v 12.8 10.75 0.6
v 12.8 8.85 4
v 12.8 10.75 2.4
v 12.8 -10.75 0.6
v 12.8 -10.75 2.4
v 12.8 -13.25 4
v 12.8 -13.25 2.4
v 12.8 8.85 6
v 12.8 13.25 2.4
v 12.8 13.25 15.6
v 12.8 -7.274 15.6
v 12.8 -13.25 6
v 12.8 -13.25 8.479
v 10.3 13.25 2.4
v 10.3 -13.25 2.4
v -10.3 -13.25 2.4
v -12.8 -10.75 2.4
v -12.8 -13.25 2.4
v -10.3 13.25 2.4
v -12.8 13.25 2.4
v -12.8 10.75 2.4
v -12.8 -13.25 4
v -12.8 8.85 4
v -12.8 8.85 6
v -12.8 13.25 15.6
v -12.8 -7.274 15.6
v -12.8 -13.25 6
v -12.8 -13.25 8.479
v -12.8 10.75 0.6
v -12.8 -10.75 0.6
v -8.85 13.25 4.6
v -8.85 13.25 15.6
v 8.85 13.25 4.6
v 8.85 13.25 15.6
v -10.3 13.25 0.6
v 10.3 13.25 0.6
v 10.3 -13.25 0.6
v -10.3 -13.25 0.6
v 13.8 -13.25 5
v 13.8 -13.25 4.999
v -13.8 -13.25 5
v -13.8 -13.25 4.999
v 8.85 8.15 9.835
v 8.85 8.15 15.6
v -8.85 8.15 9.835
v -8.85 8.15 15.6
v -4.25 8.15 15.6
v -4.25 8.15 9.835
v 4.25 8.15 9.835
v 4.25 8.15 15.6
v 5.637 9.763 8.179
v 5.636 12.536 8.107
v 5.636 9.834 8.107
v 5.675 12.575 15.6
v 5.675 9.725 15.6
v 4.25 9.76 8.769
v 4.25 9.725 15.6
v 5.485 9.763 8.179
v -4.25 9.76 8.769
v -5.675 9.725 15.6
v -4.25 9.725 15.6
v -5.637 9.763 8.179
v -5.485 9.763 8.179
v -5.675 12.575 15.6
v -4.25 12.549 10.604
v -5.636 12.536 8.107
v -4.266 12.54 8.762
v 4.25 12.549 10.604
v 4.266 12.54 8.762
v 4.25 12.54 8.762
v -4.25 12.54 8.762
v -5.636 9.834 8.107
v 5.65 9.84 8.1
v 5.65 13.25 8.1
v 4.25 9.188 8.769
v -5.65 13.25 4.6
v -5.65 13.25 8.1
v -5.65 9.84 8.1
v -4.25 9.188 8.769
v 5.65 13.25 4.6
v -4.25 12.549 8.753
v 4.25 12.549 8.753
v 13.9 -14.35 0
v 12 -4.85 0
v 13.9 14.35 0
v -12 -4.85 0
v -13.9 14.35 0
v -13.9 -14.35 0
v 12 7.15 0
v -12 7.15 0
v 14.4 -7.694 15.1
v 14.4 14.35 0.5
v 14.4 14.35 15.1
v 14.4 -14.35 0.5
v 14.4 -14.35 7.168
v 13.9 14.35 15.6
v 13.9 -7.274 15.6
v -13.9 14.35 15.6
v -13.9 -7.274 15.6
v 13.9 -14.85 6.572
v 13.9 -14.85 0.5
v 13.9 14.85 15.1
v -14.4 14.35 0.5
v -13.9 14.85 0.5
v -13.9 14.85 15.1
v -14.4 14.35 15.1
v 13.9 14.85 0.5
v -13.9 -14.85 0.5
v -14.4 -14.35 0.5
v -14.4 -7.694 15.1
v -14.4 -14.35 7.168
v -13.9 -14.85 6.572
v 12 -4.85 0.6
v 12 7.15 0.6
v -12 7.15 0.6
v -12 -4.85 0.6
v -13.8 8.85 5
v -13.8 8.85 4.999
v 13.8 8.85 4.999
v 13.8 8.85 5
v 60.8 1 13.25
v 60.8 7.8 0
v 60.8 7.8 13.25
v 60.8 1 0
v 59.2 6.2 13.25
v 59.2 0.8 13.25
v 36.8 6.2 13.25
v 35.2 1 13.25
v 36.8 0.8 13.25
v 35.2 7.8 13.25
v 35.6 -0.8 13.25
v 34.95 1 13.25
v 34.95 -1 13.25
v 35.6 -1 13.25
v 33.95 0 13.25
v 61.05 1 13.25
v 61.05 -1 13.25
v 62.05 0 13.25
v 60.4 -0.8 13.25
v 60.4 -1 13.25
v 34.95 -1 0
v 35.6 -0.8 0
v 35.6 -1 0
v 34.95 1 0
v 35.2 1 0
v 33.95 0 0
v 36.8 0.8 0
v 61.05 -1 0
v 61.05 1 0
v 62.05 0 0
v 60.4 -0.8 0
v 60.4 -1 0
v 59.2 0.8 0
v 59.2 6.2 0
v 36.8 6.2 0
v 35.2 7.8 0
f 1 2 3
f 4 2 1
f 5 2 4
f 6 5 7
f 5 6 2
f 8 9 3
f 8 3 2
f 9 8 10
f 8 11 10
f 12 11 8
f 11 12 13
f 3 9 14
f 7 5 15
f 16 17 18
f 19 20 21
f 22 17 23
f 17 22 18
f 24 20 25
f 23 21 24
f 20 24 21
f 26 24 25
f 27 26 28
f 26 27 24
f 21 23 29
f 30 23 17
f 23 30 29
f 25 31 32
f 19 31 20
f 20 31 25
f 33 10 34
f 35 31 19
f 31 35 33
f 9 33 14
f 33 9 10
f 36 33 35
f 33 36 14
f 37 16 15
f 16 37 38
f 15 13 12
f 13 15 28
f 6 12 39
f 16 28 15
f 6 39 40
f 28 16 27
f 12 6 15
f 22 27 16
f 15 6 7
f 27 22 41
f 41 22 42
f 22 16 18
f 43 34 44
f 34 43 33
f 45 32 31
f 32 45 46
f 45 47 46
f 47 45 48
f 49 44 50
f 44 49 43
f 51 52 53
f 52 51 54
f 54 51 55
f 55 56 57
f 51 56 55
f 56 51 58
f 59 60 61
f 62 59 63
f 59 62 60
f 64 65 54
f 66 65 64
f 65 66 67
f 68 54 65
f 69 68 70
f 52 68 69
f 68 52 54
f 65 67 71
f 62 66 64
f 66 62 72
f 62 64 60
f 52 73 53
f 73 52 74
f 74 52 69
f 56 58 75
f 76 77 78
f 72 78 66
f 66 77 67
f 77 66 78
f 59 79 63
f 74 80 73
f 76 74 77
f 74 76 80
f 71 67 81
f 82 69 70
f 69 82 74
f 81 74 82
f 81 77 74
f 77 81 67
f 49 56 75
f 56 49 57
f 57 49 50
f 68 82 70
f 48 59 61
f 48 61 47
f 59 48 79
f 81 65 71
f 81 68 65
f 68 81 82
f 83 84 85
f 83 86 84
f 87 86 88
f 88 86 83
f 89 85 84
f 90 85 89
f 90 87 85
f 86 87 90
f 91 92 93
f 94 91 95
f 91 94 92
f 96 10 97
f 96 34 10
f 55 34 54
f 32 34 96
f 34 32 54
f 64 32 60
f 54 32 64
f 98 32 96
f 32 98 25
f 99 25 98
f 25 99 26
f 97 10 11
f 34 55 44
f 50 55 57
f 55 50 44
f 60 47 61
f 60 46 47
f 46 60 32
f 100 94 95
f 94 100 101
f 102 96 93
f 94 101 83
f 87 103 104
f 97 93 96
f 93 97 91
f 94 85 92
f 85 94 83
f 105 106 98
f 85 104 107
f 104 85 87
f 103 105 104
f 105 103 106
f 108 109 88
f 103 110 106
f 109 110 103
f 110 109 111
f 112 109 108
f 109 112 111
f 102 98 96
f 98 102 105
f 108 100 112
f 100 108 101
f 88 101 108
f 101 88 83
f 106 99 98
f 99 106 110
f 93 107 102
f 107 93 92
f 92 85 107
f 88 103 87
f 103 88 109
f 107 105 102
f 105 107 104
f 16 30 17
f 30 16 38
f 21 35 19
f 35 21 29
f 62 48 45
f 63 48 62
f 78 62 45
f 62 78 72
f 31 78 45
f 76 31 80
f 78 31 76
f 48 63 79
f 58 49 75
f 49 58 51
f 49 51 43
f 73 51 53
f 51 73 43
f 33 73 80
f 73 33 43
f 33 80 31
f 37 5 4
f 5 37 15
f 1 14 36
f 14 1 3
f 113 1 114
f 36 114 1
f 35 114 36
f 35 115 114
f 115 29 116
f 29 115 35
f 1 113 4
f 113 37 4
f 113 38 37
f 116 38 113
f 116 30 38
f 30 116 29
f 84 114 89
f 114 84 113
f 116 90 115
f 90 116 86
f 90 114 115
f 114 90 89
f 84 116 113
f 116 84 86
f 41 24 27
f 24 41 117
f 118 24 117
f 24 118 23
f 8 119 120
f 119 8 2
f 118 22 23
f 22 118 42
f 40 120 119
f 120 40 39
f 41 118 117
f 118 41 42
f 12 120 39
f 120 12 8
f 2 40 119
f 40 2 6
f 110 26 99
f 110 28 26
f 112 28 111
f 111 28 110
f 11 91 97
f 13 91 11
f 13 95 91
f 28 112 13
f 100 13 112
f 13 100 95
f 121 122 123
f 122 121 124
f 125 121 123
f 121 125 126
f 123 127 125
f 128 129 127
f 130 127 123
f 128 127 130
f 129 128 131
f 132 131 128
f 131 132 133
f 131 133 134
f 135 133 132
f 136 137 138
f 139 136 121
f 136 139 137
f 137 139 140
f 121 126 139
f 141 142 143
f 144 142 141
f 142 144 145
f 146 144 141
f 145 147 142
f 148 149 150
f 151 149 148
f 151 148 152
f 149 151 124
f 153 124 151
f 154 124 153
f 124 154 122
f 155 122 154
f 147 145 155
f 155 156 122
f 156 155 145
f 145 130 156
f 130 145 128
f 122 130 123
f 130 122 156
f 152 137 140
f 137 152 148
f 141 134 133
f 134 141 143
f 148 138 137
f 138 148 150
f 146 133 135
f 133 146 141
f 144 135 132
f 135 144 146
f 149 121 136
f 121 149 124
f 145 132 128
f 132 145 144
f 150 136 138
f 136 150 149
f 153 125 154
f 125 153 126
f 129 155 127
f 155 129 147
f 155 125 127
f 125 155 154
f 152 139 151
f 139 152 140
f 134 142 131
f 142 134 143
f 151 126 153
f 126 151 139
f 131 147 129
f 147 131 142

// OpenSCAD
// SSD1306 oled module cover
// design by Marius Gheorghescu, September 2020

// offset between the OLED PCB and CurrentRanger PCB
pcb2pcb_offset = 12.60;

// pcb width&height + some clearance
oled_pcb_x = 25.3 + 0.3;
oled_pcb_y = 26.1 + 0.4;

// assuming square pattern
oled_screw_spacing = 21;

// screen dimensions
oled_screen_x = 24;
oled_screen_y = 12;
oled_screen_thickness = 2.4;

// oled offset from center (should be closer to the pins)
oled_screen_y_offset = 1.15;


oled_pcb_thickness = 1.6;

// connector + some clearance
connector_x = 11.3;
connector_y = 2.8;

// ideally multiple of extrusion width to minimize thin walls
wall_thickness = 1.6;
top_wall_thickness = 0.6;

// leave opening to see the logo / access serial 
open_bottom = 1;


// internal and computed values (LCD module + 2-3 layers of print)
epsilon = 0.001;
total_case_height = pcb2pcb_offset + oled_screen_thickness + top_wall_thickness;
retainer_clip_cutout = connector_y + wall_thickness;


module case()
{    
    difference() {

        translate([0, 0, total_case_height/2])
        hull() {
            cube([2*wall_thickness + oled_pcb_x-1, 2*wall_thickness + oled_pcb_y-1, total_case_height], center=true);
            cube([2*wall_thickness + oled_pcb_x, 2*wall_thickness + oled_pcb_y-1, total_case_height-1], center=true);    
            cube([2*wall_thickness + oled_pcb_x-1, 2*wall_thickness + oled_pcb_y, total_case_height-1], center=true);    
        }

        // PCB corner supports (look ma, no screws!)
        translate([0,0, (oled_screen_thickness + oled_pcb_thickness)/2 + top_wall_thickness])
            hull() {
                cube([oled_pcb_x-5, oled_pcb_y, oled_screen_thickness + oled_pcb_thickness], center=true);
                cube([oled_pcb_x, oled_pcb_y-5, oled_screen_thickness + oled_pcb_thickness], center=true);
                translate([0, 0, total_case_height])
                    cube([oled_pcb_x, epsilon, epsilon], center=true);
            }

        // pcb load path
        translate([0,0, total_case_height/2 + oled_screen_thickness])
        {
            difference() {
                
                union() {
                    cube([oled_pcb_x, oled_pcb_y, total_case_height], center=true);                
                }
                
                translate([0, oled_pcb_y/2 - connector_y*0.75, 0])
                    cube([connector_x + 4*wall_thickness, connector_y + + 2*wall_thickness, total_case_height], center=true);                
            }
        }

        // LCD cutout
        translate([0, oled_screen_y_offset, 0])
            cube([oled_screen_x, oled_screen_y, total_case_height], center=true);
        
        // connector    
        taper_amount = 0.08;
        translate([0, oled_pcb_y/2 - connector_y*0.75, total_case_height*3/2 - pcb2pcb_offset])
        {
            hull() {
                translate([0, 0, total_case_height/2])
                    cube([connector_x + taper_amount, connector_y + taper_amount, epsilon], center=true);
                translate([0, 0, -total_case_height/2])
                    cube([connector_x - taper_amount, connector_y - taper_amount, epsilon], center=true);
            }
            

            // connector load clearance
            hull() {
                translate([0, connector_y/8, -total_case_height/3])
                    cube([connector_x, connector_y*1.25, 5], center=true);

                translate([0, -connector_y, 0])
                    cube([epsilon, 4+epsilon, epsilon], center=true);
            }
           
            translate([0,-wall_thickness/2 - epsilon, 0])
                cube([connector_x - connector_y, connector_y+wall_thickness, total_case_height], center=true);
        }
        
    
            
        // retaining clip
        translate([0, -retainer_clip_cutout/2, oled_screen_thickness + oled_pcb_thickness + 1])
        hull() {
            cube([oled_pcb_x + 2, oled_pcb_y - retainer_clip_cutout, epsilon], center=true);
            cube([oled_pcb_x, oled_pcb_y - retainer_clip_cutout, 2], center=true);
        }
            
                
        if (open_bottom) {            
            // opening to see the logo / access the BT/serial connector
            rotate([50,0,0])
            translate([0,0, total_case_height + 100/2])
                cube([100,100,100], center=true);
        }
        
    }

}

module retainer_clip()
{

    // springiness - how much to oversize it so it stays put
    oversize = 0.5;
    
    //clip_height = oled_pcb_y - retainer_clip_cutout - wall_thickness;
    clip_height = oled_pcb_y/2;
    
    difference() {
        
        union() {
            translate([0, total_case_height/4, clip_height/2])
                cube([oled_pcb_x, total_case_height/2, clip_height], center=true);
            
            // wings
            translate([0,0, clip_height/2])
            hull() {
                cube([oled_pcb_x + 2 + oversize, epsilon, clip_height], center=true);
            
                    cube([oled_pcb_x + oversize, 2, clip_height], center=true);
            }
        }

        // make it elastic
        translate([0, total_case_height/4 - wall_thickness, clip_height/2])
            cube([oled_pcb_x - 2*wall_thickness, total_case_height/2, clip_height + epsilon], center=true);
        
        // clearance for the resistors on the PCB, just in case
        hull() {
            translate([0, 0, clip_height/2])
                cube([oled_pcb_x - 2*wall_thickness, wall_thickness, clip_height + epsilon], center=true);
            translate([0, -wall_thickness, clip_height/2])
                cube([oled_pcb_x - 2*wall_thickness + wall_thickness*1.5, wall_thickness, clip_height + epsilon], center=true);
        }

    }
}

case();

translate([2*oled_screen_x, 0, 0])
    retainer_clip();
